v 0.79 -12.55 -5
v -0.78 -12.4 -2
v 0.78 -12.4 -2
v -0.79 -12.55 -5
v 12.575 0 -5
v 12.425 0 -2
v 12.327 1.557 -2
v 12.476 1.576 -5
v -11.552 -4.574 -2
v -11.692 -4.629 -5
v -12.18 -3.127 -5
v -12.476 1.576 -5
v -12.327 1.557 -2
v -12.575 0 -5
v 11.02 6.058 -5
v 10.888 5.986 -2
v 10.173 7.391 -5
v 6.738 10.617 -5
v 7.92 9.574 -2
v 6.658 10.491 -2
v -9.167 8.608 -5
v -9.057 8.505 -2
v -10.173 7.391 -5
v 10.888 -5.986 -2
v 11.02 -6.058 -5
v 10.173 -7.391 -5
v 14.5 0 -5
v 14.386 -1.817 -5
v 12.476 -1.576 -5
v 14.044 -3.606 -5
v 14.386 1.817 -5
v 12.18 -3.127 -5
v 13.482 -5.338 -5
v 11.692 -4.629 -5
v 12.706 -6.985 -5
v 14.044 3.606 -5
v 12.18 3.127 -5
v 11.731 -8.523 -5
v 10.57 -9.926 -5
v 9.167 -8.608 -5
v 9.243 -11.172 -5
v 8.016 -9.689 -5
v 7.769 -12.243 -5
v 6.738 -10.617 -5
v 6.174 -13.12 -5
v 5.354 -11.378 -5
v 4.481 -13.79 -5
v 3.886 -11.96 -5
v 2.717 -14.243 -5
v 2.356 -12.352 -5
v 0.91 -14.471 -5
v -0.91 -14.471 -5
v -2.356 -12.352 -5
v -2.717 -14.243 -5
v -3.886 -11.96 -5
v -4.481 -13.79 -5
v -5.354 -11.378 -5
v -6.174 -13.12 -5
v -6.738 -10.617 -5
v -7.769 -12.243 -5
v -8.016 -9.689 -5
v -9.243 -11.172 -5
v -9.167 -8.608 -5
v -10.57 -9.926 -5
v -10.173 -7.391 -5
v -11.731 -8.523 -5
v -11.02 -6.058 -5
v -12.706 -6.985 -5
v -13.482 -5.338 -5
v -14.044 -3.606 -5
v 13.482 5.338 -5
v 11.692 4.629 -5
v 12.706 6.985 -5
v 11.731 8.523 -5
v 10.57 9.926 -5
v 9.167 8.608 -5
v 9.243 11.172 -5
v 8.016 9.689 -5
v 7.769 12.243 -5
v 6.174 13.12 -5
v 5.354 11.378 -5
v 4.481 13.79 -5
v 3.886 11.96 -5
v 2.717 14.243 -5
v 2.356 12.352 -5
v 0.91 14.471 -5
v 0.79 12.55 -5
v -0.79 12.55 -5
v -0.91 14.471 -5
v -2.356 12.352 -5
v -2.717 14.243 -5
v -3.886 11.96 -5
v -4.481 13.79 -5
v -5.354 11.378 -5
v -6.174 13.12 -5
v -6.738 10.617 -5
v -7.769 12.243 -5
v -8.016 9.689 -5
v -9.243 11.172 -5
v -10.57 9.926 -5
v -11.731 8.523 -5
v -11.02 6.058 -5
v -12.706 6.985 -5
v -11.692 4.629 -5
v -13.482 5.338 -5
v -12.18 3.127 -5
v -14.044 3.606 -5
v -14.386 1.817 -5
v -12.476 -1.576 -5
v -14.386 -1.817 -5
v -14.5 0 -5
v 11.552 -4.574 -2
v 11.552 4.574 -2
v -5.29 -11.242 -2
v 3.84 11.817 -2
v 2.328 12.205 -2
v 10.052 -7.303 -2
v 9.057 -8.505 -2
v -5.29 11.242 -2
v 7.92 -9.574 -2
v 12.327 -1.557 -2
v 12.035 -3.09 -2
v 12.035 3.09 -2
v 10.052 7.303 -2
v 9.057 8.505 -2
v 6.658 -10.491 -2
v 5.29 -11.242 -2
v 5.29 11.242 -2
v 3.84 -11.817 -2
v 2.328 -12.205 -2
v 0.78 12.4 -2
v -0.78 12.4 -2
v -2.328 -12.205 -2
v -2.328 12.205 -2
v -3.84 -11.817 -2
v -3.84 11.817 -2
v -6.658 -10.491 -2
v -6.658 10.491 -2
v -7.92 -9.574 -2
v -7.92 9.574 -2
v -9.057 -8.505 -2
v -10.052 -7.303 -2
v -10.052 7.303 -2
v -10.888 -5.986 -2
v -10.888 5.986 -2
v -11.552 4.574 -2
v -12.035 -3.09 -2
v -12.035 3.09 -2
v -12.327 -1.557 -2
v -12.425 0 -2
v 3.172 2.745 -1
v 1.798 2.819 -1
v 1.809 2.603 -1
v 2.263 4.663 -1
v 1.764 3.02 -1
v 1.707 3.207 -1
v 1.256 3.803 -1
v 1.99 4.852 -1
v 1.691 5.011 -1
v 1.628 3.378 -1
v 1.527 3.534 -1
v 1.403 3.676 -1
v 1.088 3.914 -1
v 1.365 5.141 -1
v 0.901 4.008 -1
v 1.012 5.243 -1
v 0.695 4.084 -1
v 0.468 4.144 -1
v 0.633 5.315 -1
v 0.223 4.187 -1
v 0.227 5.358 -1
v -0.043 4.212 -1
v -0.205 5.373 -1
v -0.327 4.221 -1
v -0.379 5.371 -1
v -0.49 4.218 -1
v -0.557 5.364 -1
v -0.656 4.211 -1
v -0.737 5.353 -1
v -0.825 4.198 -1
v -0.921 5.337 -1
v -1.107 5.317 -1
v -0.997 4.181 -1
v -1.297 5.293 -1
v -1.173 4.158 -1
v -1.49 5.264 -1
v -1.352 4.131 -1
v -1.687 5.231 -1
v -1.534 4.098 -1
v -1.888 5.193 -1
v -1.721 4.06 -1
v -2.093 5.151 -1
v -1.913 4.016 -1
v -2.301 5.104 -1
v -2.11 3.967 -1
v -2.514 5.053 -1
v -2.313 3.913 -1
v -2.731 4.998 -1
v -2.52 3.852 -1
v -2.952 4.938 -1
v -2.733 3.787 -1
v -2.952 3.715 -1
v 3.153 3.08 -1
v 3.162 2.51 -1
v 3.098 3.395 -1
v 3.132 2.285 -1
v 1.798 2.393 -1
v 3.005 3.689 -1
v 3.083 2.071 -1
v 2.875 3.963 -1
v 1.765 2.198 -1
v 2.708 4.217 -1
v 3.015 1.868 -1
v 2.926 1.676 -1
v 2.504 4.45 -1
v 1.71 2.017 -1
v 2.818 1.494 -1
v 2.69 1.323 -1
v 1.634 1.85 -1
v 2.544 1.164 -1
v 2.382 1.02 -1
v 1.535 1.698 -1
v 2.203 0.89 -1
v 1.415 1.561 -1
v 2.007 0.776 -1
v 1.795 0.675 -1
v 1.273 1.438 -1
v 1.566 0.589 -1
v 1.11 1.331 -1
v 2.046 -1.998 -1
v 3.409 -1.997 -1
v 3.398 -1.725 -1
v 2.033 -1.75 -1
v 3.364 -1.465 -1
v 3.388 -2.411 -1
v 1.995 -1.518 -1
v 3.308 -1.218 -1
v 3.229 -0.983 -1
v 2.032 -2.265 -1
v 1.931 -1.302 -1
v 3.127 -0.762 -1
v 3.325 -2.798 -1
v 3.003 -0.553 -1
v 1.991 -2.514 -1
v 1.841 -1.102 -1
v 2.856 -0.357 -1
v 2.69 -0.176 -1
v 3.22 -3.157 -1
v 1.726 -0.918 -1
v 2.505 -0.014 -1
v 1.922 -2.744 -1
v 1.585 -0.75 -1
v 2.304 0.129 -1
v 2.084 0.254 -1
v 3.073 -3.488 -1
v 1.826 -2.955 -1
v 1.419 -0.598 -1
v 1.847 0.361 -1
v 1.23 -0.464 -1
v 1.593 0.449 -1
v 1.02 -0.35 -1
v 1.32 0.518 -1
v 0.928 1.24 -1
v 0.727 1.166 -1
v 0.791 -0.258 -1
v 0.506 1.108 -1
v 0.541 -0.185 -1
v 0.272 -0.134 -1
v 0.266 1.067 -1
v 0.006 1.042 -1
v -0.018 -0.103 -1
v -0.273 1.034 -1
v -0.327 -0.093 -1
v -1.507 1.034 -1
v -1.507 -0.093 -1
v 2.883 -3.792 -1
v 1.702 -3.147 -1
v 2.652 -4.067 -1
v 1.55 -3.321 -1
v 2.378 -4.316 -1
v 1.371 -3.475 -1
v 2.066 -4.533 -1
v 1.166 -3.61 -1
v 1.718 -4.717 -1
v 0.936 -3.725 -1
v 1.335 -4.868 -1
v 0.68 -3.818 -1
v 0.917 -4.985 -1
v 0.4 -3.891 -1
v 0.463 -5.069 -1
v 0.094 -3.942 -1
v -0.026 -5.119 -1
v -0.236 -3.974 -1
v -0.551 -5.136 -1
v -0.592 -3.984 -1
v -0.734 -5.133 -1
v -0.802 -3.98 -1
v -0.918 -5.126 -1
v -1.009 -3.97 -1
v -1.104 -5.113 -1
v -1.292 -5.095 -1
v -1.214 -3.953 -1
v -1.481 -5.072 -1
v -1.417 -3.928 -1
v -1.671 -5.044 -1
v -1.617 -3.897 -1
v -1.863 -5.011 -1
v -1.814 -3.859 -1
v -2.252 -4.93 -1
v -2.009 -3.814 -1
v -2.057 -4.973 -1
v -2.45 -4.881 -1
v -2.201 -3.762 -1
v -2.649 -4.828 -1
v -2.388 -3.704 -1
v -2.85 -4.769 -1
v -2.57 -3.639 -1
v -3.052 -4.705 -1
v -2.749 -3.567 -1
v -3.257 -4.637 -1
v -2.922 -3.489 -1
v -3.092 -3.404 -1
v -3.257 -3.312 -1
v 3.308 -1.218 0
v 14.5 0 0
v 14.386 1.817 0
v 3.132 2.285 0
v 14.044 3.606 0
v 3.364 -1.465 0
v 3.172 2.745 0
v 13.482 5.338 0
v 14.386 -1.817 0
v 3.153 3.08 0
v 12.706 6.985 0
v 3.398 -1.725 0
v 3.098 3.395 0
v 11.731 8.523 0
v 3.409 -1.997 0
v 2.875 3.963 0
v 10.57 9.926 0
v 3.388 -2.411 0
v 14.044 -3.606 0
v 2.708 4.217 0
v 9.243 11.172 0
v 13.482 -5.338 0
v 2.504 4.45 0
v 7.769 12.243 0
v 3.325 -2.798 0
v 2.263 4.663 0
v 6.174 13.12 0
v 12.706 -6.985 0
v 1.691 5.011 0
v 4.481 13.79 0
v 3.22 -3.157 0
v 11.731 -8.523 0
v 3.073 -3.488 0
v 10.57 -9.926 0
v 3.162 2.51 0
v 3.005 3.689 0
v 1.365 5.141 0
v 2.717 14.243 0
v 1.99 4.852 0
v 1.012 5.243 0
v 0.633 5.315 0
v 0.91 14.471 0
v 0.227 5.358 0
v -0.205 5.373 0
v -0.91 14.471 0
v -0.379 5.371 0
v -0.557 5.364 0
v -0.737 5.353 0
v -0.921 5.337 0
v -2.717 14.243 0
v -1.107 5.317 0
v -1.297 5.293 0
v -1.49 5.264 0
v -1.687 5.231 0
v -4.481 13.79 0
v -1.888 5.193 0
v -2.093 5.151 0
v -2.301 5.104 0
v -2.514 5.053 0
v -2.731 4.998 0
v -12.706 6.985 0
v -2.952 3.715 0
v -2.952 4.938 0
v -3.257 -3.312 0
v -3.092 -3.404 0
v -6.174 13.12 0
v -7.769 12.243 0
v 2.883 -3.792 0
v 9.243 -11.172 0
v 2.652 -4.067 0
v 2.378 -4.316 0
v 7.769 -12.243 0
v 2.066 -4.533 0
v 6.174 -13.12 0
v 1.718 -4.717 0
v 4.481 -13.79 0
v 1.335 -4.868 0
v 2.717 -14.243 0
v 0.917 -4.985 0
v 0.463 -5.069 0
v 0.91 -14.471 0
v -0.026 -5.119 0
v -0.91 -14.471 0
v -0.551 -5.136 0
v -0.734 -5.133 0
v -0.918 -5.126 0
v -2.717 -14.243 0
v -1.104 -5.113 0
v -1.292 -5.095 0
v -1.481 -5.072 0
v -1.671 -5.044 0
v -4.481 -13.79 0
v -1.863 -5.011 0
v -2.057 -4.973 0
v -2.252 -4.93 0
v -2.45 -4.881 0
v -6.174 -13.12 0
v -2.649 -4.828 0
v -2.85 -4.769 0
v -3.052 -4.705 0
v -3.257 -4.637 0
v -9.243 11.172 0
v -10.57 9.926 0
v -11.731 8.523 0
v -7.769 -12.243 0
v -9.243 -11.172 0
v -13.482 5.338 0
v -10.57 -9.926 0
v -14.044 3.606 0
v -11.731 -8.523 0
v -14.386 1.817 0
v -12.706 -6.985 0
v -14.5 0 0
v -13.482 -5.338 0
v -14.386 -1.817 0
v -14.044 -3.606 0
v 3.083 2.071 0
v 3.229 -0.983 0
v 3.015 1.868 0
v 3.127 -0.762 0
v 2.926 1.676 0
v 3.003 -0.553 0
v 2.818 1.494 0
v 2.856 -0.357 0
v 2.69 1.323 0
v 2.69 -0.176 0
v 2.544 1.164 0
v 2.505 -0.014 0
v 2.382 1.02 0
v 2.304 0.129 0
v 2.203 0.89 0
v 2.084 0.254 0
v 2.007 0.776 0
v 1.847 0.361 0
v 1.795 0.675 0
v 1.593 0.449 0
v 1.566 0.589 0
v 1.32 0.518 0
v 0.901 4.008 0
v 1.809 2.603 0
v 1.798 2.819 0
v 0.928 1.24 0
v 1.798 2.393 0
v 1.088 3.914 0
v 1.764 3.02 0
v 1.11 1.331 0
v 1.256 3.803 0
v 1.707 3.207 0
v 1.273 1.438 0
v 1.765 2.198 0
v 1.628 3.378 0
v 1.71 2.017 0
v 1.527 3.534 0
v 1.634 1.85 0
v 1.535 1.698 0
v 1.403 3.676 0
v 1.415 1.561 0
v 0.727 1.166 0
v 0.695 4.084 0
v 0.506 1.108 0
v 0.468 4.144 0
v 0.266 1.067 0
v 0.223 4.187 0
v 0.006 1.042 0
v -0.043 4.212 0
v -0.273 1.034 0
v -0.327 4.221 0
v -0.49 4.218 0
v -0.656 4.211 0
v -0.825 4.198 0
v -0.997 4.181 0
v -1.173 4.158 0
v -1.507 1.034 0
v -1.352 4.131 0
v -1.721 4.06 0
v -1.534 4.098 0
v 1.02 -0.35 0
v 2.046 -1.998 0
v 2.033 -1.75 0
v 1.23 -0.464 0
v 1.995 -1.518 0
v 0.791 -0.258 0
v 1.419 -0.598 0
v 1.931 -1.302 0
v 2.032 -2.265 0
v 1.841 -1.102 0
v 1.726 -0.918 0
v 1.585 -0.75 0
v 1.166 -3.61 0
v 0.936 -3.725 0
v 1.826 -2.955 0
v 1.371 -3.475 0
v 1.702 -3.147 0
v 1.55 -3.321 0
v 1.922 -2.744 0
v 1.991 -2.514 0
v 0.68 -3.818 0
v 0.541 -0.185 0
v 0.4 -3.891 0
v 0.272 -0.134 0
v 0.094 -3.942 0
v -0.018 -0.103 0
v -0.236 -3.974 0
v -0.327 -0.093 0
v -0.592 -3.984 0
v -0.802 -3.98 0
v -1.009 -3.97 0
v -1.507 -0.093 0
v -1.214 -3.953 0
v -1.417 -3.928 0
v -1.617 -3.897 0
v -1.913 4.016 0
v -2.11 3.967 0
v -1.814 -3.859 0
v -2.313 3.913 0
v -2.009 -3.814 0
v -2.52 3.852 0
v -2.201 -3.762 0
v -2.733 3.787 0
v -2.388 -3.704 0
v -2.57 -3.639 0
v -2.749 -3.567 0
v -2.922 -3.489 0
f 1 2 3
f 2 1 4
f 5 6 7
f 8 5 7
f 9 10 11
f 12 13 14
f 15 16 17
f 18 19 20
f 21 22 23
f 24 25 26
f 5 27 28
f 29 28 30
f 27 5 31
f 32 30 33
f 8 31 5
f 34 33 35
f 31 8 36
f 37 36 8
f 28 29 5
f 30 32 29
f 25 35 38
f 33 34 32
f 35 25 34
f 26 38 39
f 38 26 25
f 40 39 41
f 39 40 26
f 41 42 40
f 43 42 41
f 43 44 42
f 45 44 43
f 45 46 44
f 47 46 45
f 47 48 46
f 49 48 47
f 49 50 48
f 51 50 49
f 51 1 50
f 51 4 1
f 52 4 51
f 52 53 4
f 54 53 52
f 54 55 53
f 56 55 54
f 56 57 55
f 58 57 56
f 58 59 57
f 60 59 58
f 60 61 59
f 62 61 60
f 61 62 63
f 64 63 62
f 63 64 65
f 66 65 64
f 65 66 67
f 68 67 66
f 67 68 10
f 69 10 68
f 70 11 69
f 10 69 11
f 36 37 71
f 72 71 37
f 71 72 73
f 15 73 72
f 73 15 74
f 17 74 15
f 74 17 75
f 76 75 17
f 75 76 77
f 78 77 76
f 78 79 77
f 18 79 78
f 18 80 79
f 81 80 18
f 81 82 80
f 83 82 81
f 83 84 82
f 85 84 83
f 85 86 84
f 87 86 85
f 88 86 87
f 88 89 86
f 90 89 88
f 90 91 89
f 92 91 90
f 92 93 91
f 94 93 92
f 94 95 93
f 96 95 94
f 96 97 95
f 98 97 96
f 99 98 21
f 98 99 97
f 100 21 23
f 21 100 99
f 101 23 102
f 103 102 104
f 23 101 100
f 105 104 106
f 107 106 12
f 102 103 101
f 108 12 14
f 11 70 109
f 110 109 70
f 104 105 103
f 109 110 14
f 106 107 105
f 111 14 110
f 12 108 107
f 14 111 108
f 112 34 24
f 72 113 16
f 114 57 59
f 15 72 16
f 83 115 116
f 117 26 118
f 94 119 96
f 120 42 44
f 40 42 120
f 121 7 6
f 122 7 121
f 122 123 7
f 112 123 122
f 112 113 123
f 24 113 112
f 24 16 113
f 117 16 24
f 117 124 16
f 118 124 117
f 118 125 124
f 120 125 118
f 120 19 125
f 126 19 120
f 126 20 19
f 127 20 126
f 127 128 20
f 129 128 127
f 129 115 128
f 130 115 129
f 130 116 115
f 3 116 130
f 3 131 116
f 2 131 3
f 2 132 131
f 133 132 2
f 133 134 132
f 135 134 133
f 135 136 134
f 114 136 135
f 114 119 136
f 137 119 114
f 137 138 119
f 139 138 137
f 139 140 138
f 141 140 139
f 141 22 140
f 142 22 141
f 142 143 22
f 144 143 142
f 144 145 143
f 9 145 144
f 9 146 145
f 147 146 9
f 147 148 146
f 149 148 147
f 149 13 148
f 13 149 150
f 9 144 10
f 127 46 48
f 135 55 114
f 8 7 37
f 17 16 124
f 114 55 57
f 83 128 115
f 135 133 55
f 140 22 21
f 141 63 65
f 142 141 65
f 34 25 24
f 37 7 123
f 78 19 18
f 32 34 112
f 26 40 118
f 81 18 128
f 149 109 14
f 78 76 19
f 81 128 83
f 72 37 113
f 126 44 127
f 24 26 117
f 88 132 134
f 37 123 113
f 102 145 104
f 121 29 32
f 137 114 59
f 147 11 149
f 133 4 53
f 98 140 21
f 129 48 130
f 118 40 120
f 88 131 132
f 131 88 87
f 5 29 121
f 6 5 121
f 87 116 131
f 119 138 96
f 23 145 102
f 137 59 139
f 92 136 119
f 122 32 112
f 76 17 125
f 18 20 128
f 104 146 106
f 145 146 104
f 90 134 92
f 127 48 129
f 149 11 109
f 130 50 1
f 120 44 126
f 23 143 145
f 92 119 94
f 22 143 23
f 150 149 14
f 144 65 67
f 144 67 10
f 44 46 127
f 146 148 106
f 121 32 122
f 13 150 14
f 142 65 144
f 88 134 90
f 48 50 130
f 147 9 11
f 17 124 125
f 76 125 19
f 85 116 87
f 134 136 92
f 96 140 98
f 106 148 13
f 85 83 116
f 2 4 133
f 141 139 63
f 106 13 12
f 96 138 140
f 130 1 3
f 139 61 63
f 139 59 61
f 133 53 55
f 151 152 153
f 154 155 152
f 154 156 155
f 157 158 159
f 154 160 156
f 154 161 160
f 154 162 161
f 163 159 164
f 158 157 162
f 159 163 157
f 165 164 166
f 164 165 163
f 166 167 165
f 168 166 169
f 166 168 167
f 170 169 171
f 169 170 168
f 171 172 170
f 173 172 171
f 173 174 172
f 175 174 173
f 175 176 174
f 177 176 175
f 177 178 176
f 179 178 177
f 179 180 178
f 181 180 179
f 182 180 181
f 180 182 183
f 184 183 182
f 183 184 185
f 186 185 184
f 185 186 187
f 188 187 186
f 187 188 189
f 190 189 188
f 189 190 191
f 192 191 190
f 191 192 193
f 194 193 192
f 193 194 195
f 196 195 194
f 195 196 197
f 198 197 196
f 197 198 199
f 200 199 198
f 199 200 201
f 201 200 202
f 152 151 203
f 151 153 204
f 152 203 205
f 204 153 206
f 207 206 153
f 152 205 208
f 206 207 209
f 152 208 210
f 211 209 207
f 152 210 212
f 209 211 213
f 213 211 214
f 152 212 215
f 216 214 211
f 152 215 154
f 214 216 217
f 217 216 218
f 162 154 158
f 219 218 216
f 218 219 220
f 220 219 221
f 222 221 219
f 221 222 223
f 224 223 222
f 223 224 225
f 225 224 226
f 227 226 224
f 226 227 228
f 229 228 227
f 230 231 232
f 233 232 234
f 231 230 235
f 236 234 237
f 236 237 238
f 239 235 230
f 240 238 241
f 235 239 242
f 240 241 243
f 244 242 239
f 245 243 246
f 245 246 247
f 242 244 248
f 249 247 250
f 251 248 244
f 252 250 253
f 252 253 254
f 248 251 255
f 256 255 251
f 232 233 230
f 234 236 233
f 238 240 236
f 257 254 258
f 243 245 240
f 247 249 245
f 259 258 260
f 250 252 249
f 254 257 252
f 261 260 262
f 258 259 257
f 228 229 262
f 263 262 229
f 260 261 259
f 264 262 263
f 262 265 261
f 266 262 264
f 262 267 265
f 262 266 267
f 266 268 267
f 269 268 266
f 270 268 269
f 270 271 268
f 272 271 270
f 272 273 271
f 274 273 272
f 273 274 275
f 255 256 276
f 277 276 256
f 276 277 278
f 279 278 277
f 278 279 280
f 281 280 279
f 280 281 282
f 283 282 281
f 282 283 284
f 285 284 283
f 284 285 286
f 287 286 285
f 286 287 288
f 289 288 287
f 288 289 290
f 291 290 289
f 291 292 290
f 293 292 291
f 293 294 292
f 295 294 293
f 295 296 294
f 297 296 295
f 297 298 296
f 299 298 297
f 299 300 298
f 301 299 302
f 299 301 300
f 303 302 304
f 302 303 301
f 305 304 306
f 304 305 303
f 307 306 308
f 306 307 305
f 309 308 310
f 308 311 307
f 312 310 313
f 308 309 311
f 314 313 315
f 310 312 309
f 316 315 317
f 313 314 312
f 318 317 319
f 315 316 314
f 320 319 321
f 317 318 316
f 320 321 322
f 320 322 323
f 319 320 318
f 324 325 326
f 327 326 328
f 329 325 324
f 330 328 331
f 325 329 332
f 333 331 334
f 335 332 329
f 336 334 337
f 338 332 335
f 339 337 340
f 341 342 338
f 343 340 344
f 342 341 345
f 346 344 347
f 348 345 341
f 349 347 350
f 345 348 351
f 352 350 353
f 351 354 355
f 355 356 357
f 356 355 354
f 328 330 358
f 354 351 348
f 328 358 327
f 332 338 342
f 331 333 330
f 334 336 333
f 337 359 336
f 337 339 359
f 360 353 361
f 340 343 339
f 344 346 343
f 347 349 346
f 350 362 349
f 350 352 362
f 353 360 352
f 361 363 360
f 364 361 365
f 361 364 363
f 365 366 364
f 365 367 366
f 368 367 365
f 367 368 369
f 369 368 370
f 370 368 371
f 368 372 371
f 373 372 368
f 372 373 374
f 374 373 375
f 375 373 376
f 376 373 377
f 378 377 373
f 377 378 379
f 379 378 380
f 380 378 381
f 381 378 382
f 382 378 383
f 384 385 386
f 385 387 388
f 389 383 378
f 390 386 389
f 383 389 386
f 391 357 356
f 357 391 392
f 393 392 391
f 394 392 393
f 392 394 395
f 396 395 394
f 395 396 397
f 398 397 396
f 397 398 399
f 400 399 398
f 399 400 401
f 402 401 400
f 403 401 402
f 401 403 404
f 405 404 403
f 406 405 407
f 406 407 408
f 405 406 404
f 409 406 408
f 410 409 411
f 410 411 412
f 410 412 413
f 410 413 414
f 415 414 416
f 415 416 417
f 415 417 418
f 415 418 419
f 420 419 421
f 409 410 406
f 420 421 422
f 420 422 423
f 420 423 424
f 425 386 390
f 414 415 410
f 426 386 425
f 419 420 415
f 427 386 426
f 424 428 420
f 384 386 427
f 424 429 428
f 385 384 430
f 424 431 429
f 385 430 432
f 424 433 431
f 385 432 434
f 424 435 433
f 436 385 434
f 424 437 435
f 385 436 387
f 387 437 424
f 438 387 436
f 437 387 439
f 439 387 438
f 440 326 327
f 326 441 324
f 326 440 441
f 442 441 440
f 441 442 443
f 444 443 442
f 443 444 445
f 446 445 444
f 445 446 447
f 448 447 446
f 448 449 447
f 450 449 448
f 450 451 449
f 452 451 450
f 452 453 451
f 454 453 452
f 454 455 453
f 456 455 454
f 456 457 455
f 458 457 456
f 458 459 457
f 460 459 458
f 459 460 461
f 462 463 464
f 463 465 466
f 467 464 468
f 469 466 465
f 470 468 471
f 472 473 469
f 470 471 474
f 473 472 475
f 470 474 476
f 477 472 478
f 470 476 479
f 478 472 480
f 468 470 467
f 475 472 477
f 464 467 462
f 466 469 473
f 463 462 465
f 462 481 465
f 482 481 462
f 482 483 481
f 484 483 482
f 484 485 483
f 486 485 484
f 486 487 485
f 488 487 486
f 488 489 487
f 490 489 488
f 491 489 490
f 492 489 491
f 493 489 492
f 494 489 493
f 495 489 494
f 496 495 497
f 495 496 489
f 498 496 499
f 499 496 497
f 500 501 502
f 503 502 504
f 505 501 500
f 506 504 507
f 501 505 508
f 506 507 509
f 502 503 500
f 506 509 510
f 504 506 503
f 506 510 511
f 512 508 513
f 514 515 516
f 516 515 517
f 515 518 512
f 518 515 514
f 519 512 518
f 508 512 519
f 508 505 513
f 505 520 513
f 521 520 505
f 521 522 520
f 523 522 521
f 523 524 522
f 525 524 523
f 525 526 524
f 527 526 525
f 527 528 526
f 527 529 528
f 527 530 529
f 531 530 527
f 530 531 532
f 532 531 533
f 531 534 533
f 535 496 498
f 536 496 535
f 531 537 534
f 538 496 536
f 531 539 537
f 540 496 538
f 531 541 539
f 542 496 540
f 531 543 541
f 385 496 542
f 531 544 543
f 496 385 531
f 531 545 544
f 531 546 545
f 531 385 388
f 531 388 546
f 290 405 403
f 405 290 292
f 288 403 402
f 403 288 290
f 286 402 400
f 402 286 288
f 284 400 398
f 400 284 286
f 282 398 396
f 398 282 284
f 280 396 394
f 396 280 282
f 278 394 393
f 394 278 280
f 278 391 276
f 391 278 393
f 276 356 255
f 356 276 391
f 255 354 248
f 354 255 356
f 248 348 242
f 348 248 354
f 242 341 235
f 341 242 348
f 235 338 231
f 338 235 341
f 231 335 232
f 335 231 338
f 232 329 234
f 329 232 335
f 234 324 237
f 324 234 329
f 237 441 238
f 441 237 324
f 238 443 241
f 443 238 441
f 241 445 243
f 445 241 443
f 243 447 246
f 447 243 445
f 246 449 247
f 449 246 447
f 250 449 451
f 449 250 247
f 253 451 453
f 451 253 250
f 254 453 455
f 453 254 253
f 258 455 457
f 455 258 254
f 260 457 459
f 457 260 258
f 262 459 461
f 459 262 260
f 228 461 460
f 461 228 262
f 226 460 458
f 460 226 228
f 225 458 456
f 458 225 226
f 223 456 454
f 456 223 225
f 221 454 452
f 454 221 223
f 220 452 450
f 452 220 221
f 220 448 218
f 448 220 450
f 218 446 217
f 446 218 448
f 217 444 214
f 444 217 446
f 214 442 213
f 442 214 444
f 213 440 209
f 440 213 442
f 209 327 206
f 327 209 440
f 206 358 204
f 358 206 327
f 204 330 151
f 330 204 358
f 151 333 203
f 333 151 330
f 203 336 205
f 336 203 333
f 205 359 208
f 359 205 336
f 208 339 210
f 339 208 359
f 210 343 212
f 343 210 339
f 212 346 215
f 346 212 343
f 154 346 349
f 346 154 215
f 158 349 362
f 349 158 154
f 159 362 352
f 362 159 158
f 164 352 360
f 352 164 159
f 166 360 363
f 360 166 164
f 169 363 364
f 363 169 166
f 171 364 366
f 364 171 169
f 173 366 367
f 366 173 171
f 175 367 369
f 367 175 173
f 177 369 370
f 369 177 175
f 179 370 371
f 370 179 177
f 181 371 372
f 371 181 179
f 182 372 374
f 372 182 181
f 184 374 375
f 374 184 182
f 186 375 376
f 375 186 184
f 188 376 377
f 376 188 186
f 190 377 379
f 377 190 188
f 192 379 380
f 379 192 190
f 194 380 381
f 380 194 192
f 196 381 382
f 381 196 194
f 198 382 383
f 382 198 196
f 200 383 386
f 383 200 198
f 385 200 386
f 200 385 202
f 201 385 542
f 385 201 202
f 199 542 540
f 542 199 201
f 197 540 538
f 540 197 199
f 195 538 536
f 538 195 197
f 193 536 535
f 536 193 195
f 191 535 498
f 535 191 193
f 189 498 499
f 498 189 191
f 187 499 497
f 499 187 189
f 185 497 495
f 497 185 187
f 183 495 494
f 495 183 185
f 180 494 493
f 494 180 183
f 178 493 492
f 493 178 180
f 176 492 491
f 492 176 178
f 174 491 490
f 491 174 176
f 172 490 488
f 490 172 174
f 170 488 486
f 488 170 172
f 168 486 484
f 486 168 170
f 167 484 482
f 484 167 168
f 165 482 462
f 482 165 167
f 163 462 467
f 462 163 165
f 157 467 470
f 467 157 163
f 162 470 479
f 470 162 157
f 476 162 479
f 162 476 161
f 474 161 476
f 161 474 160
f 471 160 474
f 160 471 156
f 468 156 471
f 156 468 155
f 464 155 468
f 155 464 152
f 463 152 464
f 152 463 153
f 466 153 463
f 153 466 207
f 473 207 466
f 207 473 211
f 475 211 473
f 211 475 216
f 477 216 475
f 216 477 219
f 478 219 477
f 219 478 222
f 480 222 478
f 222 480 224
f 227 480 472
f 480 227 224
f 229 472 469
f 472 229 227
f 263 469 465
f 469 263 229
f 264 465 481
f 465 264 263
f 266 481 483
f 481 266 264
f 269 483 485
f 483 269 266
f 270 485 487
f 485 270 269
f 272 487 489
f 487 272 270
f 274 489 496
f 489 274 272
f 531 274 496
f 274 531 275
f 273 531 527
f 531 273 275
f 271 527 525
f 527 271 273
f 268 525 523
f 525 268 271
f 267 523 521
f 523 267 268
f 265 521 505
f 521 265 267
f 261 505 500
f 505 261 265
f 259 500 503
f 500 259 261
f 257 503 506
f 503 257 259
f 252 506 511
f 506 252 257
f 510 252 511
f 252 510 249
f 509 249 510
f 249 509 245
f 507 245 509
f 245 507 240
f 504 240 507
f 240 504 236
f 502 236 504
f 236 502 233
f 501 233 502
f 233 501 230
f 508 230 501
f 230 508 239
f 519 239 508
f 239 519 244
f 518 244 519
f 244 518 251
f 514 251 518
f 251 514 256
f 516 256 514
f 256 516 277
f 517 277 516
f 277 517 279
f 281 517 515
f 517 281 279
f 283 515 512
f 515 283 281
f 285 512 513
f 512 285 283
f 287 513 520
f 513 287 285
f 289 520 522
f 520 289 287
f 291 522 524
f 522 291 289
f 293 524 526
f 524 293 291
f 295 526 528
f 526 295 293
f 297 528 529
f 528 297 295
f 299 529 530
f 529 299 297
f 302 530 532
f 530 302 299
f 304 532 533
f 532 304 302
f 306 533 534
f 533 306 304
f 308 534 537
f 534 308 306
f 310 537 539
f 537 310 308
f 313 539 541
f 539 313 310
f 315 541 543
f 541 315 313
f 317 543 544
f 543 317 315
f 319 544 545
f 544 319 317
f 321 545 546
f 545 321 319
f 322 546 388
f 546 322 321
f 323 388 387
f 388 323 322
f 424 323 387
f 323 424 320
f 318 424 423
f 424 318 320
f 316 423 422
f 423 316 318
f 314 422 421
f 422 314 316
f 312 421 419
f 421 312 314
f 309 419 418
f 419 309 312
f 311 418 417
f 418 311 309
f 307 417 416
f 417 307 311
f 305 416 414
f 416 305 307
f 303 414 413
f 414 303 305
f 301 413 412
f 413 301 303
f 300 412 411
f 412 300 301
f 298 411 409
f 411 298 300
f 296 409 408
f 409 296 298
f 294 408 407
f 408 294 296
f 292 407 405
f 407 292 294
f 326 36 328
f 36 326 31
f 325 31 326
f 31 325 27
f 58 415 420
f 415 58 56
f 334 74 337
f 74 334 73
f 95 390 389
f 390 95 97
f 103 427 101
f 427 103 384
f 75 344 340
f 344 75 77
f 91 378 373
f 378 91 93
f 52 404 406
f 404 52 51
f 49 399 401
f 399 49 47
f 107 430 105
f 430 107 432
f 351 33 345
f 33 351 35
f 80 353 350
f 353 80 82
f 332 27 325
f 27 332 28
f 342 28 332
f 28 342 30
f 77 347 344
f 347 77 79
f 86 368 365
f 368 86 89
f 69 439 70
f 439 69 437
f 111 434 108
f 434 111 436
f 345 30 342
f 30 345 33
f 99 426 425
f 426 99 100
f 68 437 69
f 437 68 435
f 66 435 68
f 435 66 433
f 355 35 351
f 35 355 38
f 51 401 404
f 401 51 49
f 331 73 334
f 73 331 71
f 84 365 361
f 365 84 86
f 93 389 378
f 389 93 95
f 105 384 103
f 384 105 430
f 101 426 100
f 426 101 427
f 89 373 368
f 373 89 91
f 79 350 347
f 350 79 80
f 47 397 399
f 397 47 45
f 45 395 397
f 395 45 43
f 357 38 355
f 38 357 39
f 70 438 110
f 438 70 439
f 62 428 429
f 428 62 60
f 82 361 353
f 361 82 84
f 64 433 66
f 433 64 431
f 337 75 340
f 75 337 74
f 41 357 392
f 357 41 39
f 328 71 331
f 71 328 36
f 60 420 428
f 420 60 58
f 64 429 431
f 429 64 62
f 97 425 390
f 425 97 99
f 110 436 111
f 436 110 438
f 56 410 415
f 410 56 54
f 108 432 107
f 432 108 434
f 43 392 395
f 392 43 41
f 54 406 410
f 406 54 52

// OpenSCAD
$fn = 50;


difference() {
	union() {
		translate(v = [0, 0, -5.0000000000]) {
			cylinder(h = 5, r = 14.5000000000);
		}
	}
	union() {
		#translate(v = [0, 0, -5.0000000000]) {
			cylinder(h = 3, r1 = 12.5750000000, r2 = 12.4250000000);
		}
		translate(v = [0, 0, -1]) {
			linear_extrude(height = 1) {
				text(font = "Impact", halign = "center", size = 10, text = "3", valign = "center");
			}
		}
	}
}
